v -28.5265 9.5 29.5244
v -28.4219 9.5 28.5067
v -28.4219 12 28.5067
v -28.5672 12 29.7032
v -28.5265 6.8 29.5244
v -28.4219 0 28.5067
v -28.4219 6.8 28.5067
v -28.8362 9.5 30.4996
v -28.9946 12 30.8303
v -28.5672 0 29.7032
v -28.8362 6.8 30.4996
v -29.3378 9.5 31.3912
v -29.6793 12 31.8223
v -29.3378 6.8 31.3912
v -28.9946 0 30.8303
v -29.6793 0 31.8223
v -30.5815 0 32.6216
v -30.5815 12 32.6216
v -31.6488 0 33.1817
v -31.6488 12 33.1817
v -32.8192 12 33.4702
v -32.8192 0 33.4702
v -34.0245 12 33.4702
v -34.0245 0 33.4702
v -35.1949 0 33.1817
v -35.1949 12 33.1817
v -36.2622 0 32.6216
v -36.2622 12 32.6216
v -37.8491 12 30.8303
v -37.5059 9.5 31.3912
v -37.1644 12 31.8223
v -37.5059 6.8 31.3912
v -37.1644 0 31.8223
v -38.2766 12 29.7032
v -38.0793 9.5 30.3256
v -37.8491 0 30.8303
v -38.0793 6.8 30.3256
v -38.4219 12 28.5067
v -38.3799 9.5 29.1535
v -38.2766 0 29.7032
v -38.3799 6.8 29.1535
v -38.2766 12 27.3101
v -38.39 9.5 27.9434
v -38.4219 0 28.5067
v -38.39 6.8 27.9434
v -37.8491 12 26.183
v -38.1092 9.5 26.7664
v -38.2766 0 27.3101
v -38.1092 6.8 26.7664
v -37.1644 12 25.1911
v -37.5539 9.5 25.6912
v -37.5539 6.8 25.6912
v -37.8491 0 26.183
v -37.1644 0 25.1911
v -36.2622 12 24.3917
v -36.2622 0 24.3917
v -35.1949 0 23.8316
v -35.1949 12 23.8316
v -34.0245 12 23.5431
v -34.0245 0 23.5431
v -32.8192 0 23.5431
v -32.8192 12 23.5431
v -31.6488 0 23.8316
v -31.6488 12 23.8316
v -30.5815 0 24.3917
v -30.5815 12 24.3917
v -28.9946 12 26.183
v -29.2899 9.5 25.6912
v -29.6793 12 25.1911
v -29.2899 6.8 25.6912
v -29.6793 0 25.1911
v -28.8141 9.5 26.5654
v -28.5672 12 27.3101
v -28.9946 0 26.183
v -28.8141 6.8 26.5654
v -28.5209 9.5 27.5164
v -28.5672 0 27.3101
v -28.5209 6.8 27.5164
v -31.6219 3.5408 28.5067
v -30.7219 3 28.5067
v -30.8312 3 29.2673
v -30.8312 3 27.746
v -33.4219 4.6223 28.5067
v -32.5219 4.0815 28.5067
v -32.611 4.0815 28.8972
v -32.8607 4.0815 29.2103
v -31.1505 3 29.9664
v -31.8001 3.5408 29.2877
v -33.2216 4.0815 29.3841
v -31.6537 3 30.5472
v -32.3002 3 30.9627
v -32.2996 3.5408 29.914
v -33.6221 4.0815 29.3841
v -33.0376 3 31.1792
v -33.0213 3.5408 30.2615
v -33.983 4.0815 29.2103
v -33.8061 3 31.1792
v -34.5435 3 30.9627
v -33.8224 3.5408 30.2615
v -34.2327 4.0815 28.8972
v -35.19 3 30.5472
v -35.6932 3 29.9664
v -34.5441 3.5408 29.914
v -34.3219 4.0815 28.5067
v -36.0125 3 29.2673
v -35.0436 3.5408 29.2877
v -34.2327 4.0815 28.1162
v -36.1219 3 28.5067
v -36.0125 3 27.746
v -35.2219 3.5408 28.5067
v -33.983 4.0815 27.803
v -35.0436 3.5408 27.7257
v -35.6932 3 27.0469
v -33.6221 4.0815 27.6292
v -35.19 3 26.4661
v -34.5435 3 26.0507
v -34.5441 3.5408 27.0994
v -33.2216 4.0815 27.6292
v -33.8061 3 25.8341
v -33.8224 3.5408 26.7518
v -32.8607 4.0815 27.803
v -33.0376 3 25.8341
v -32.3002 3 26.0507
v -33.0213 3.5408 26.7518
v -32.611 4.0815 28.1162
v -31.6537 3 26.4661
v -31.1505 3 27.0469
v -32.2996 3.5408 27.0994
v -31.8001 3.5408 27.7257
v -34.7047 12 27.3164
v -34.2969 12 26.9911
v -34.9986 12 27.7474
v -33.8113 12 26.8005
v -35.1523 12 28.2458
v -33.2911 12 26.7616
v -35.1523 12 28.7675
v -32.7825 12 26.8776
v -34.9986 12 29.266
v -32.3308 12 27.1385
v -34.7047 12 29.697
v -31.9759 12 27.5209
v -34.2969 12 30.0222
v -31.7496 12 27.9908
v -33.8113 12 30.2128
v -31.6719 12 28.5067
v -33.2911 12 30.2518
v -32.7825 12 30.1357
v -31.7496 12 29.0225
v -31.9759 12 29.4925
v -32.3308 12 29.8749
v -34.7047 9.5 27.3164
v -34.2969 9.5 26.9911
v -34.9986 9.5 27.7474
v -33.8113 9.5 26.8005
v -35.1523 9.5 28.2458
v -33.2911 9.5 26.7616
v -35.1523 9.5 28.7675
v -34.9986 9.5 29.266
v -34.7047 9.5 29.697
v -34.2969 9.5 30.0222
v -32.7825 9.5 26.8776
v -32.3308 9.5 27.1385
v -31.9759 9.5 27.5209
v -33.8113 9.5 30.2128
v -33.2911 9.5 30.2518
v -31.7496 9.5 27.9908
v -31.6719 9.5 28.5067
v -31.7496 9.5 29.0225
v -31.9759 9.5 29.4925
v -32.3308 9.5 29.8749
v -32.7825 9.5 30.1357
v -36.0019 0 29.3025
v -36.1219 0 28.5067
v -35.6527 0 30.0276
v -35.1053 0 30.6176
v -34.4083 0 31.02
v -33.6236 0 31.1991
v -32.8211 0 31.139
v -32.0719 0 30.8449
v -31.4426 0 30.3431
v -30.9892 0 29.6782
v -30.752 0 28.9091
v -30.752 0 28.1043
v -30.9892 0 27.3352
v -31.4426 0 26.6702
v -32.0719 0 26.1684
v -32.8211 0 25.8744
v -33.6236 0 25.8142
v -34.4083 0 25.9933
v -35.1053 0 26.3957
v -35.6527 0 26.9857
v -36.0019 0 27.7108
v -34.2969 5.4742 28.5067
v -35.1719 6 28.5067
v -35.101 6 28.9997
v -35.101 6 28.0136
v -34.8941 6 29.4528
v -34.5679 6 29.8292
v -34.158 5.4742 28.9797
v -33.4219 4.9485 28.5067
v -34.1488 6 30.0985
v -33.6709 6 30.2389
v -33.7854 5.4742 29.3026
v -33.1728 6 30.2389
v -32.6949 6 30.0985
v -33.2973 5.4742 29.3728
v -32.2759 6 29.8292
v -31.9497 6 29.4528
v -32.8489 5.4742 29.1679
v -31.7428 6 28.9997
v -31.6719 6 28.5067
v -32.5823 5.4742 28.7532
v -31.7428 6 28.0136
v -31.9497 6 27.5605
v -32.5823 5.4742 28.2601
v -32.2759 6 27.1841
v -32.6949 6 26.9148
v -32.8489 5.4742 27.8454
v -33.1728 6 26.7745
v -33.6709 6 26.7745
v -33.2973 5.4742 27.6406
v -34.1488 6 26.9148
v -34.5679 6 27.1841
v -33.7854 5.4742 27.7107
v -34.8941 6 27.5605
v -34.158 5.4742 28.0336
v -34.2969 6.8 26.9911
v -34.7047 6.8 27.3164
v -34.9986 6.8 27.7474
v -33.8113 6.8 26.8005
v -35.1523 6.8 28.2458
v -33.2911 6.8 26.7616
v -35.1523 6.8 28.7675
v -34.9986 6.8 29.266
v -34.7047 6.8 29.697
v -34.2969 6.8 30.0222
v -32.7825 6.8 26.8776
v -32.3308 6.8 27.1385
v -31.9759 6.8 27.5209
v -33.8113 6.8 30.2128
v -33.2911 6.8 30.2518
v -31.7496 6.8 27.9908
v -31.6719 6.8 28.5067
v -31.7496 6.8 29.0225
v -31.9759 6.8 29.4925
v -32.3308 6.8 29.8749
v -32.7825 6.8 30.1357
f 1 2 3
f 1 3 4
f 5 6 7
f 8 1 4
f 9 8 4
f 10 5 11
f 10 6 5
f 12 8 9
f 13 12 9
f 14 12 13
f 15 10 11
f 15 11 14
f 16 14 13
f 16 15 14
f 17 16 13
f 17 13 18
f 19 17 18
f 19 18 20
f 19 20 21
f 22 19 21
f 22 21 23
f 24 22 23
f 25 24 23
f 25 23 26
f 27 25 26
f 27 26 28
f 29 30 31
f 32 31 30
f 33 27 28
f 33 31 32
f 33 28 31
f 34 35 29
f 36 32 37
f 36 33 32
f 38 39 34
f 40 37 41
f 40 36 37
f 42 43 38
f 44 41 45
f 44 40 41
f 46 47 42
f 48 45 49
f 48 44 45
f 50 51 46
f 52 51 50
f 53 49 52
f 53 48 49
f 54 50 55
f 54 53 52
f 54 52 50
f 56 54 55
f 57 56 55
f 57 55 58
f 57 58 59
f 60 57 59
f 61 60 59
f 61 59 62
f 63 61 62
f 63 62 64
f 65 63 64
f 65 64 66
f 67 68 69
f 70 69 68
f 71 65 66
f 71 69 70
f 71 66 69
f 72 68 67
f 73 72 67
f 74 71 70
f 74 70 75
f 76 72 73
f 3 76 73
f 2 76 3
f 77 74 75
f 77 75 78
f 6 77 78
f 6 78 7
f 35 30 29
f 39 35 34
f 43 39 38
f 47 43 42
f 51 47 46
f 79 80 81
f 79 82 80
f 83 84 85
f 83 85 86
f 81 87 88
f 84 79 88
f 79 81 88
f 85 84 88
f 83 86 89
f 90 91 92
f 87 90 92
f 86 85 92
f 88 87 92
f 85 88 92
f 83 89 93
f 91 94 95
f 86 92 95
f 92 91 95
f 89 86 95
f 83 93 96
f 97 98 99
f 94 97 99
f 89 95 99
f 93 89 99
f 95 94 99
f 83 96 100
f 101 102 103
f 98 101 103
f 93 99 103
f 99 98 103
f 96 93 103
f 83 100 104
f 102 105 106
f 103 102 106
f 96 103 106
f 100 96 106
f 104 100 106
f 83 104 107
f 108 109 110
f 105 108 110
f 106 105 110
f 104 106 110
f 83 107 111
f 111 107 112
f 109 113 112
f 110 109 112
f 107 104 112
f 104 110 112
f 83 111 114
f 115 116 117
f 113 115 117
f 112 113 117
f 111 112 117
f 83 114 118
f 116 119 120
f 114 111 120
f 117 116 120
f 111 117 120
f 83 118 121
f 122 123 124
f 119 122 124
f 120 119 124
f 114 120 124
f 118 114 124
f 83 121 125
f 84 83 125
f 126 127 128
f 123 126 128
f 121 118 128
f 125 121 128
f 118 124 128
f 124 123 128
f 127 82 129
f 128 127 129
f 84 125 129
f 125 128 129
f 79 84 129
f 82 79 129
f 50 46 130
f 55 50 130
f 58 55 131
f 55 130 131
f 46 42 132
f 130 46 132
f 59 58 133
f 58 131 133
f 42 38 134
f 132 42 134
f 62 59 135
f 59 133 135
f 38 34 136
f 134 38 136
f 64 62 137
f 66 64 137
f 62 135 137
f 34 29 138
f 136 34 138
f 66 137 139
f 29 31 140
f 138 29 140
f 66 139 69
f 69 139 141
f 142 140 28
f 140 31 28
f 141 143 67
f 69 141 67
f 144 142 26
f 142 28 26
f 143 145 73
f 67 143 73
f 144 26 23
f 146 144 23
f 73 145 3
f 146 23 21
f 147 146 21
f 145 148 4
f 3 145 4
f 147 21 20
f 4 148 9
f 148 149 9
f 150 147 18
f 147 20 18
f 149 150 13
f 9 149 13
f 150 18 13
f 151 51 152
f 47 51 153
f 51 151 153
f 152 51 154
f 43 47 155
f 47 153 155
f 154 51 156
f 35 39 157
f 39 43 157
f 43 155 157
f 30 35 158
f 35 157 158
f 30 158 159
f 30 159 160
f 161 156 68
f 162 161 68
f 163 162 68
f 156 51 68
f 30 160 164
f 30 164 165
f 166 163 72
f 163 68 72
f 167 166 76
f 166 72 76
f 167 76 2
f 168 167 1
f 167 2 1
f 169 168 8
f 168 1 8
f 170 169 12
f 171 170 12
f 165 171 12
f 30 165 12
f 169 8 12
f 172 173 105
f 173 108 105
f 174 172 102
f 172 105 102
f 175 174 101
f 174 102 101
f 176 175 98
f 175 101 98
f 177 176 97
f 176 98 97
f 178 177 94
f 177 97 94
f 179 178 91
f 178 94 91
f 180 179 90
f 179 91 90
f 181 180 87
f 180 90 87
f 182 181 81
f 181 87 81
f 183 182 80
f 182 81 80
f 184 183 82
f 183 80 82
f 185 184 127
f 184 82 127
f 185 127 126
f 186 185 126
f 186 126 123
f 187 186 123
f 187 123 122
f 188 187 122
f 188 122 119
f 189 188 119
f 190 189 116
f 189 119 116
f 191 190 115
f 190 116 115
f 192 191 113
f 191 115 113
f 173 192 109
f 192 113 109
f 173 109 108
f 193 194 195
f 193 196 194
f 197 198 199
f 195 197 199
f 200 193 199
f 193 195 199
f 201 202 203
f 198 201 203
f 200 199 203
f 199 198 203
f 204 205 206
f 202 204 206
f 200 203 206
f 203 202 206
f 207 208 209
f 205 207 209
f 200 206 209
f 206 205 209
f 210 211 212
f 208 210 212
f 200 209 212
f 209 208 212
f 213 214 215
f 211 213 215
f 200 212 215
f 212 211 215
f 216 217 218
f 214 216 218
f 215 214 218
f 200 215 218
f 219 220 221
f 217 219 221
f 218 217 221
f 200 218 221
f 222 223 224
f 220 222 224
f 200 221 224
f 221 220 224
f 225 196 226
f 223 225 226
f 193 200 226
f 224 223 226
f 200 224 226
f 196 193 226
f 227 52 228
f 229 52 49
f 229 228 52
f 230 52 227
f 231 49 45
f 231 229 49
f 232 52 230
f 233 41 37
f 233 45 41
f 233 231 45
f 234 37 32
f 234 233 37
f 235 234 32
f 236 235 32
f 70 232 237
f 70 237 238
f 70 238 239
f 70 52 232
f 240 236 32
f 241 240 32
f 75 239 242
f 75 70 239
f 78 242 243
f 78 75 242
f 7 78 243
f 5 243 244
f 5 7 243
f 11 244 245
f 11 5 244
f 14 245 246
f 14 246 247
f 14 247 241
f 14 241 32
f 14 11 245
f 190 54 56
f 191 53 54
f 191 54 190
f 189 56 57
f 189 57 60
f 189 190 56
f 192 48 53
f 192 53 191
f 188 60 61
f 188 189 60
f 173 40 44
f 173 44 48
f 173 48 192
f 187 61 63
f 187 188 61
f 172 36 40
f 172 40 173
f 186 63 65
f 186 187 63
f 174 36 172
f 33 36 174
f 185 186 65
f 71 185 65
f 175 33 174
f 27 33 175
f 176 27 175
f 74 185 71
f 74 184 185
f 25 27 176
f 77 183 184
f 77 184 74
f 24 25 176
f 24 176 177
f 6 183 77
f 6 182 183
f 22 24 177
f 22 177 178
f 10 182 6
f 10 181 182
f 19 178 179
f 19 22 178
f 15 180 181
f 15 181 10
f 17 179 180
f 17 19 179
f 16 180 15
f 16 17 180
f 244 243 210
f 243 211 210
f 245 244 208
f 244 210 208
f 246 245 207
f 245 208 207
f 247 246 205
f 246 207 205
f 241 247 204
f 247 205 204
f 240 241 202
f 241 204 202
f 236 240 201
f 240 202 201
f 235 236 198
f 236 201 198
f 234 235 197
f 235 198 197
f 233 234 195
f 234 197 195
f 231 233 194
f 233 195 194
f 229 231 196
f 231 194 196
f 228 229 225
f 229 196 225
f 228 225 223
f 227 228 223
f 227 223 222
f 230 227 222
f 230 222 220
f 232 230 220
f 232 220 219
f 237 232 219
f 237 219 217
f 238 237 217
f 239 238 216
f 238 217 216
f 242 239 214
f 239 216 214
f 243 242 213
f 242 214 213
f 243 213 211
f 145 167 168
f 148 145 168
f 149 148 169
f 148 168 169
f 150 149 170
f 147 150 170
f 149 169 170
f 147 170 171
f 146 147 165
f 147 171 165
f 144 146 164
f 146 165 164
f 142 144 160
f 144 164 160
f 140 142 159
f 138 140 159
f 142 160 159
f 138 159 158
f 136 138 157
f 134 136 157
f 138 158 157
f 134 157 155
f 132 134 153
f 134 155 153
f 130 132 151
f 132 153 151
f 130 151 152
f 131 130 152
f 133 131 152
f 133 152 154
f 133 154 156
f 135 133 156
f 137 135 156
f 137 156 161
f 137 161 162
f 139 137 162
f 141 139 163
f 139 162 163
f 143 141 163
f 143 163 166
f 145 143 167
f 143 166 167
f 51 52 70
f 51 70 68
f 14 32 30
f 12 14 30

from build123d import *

# Parameters (mm, degrees)
F3_R     = 5
F4_DEPTH = 12
F6_D     = 5.4
F6_DEPTH = 3
F6_TIP   = 1.6223236714
F7_D     = 3.5
F7_DEPTH = 6
F7_TIP   = 1.0515060833
F8_W     = 2.7
F8_H     = 5.7
F9_DEPTH = 38.4228628705


with BuildPart() as f4:
    # F3 (on Front) → F4 (new body)
    with BuildSketch(Plane.XZ):
        with Locations((-33.4218628705, 28.5066645592)):
            Circle(F3_R)
    extrude(amount=-F4_DEPTH)

    # F6
    with Locations(Plane.XZ):
        with Locations((-33.4218628705, 28.5066645592)):
            Hole(F6_D / 2, depth=F6_DEPTH)
            with Locations((0, 0, -(F6_DEPTH + F6_TIP / 2))):  # 118° drill point
                Cone(0, F6_D / 2, F6_TIP, mode=Mode.SUBTRACT)

    # F7
    with Locations(Plane(origin=(0, 12, 0), x_dir=(-1, 0, 0), z_dir=(0, 1, 0))):
        with Locations((33.4218628705, 28.5066645592)):
            Hole(F7_D / 2, depth=F7_DEPTH)
            with Locations((0, 0, -(F7_DEPTH + F7_TIP / 2))):  # 118° drill point
                Cone(0, F7_D / 2, F7_TIP, mode=Mode.SUBTRACT)

    # F8 (on Right) → F9 (cut, through all)
    with BuildSketch(Plane.YZ):
        with Locations((8.15, 28.5412482917)):
            Rectangle(F8_W, F8_H)
    extrude(amount=-F9_DEPTH, mode=Mode.SUBTRACT)


solid = f4.part
